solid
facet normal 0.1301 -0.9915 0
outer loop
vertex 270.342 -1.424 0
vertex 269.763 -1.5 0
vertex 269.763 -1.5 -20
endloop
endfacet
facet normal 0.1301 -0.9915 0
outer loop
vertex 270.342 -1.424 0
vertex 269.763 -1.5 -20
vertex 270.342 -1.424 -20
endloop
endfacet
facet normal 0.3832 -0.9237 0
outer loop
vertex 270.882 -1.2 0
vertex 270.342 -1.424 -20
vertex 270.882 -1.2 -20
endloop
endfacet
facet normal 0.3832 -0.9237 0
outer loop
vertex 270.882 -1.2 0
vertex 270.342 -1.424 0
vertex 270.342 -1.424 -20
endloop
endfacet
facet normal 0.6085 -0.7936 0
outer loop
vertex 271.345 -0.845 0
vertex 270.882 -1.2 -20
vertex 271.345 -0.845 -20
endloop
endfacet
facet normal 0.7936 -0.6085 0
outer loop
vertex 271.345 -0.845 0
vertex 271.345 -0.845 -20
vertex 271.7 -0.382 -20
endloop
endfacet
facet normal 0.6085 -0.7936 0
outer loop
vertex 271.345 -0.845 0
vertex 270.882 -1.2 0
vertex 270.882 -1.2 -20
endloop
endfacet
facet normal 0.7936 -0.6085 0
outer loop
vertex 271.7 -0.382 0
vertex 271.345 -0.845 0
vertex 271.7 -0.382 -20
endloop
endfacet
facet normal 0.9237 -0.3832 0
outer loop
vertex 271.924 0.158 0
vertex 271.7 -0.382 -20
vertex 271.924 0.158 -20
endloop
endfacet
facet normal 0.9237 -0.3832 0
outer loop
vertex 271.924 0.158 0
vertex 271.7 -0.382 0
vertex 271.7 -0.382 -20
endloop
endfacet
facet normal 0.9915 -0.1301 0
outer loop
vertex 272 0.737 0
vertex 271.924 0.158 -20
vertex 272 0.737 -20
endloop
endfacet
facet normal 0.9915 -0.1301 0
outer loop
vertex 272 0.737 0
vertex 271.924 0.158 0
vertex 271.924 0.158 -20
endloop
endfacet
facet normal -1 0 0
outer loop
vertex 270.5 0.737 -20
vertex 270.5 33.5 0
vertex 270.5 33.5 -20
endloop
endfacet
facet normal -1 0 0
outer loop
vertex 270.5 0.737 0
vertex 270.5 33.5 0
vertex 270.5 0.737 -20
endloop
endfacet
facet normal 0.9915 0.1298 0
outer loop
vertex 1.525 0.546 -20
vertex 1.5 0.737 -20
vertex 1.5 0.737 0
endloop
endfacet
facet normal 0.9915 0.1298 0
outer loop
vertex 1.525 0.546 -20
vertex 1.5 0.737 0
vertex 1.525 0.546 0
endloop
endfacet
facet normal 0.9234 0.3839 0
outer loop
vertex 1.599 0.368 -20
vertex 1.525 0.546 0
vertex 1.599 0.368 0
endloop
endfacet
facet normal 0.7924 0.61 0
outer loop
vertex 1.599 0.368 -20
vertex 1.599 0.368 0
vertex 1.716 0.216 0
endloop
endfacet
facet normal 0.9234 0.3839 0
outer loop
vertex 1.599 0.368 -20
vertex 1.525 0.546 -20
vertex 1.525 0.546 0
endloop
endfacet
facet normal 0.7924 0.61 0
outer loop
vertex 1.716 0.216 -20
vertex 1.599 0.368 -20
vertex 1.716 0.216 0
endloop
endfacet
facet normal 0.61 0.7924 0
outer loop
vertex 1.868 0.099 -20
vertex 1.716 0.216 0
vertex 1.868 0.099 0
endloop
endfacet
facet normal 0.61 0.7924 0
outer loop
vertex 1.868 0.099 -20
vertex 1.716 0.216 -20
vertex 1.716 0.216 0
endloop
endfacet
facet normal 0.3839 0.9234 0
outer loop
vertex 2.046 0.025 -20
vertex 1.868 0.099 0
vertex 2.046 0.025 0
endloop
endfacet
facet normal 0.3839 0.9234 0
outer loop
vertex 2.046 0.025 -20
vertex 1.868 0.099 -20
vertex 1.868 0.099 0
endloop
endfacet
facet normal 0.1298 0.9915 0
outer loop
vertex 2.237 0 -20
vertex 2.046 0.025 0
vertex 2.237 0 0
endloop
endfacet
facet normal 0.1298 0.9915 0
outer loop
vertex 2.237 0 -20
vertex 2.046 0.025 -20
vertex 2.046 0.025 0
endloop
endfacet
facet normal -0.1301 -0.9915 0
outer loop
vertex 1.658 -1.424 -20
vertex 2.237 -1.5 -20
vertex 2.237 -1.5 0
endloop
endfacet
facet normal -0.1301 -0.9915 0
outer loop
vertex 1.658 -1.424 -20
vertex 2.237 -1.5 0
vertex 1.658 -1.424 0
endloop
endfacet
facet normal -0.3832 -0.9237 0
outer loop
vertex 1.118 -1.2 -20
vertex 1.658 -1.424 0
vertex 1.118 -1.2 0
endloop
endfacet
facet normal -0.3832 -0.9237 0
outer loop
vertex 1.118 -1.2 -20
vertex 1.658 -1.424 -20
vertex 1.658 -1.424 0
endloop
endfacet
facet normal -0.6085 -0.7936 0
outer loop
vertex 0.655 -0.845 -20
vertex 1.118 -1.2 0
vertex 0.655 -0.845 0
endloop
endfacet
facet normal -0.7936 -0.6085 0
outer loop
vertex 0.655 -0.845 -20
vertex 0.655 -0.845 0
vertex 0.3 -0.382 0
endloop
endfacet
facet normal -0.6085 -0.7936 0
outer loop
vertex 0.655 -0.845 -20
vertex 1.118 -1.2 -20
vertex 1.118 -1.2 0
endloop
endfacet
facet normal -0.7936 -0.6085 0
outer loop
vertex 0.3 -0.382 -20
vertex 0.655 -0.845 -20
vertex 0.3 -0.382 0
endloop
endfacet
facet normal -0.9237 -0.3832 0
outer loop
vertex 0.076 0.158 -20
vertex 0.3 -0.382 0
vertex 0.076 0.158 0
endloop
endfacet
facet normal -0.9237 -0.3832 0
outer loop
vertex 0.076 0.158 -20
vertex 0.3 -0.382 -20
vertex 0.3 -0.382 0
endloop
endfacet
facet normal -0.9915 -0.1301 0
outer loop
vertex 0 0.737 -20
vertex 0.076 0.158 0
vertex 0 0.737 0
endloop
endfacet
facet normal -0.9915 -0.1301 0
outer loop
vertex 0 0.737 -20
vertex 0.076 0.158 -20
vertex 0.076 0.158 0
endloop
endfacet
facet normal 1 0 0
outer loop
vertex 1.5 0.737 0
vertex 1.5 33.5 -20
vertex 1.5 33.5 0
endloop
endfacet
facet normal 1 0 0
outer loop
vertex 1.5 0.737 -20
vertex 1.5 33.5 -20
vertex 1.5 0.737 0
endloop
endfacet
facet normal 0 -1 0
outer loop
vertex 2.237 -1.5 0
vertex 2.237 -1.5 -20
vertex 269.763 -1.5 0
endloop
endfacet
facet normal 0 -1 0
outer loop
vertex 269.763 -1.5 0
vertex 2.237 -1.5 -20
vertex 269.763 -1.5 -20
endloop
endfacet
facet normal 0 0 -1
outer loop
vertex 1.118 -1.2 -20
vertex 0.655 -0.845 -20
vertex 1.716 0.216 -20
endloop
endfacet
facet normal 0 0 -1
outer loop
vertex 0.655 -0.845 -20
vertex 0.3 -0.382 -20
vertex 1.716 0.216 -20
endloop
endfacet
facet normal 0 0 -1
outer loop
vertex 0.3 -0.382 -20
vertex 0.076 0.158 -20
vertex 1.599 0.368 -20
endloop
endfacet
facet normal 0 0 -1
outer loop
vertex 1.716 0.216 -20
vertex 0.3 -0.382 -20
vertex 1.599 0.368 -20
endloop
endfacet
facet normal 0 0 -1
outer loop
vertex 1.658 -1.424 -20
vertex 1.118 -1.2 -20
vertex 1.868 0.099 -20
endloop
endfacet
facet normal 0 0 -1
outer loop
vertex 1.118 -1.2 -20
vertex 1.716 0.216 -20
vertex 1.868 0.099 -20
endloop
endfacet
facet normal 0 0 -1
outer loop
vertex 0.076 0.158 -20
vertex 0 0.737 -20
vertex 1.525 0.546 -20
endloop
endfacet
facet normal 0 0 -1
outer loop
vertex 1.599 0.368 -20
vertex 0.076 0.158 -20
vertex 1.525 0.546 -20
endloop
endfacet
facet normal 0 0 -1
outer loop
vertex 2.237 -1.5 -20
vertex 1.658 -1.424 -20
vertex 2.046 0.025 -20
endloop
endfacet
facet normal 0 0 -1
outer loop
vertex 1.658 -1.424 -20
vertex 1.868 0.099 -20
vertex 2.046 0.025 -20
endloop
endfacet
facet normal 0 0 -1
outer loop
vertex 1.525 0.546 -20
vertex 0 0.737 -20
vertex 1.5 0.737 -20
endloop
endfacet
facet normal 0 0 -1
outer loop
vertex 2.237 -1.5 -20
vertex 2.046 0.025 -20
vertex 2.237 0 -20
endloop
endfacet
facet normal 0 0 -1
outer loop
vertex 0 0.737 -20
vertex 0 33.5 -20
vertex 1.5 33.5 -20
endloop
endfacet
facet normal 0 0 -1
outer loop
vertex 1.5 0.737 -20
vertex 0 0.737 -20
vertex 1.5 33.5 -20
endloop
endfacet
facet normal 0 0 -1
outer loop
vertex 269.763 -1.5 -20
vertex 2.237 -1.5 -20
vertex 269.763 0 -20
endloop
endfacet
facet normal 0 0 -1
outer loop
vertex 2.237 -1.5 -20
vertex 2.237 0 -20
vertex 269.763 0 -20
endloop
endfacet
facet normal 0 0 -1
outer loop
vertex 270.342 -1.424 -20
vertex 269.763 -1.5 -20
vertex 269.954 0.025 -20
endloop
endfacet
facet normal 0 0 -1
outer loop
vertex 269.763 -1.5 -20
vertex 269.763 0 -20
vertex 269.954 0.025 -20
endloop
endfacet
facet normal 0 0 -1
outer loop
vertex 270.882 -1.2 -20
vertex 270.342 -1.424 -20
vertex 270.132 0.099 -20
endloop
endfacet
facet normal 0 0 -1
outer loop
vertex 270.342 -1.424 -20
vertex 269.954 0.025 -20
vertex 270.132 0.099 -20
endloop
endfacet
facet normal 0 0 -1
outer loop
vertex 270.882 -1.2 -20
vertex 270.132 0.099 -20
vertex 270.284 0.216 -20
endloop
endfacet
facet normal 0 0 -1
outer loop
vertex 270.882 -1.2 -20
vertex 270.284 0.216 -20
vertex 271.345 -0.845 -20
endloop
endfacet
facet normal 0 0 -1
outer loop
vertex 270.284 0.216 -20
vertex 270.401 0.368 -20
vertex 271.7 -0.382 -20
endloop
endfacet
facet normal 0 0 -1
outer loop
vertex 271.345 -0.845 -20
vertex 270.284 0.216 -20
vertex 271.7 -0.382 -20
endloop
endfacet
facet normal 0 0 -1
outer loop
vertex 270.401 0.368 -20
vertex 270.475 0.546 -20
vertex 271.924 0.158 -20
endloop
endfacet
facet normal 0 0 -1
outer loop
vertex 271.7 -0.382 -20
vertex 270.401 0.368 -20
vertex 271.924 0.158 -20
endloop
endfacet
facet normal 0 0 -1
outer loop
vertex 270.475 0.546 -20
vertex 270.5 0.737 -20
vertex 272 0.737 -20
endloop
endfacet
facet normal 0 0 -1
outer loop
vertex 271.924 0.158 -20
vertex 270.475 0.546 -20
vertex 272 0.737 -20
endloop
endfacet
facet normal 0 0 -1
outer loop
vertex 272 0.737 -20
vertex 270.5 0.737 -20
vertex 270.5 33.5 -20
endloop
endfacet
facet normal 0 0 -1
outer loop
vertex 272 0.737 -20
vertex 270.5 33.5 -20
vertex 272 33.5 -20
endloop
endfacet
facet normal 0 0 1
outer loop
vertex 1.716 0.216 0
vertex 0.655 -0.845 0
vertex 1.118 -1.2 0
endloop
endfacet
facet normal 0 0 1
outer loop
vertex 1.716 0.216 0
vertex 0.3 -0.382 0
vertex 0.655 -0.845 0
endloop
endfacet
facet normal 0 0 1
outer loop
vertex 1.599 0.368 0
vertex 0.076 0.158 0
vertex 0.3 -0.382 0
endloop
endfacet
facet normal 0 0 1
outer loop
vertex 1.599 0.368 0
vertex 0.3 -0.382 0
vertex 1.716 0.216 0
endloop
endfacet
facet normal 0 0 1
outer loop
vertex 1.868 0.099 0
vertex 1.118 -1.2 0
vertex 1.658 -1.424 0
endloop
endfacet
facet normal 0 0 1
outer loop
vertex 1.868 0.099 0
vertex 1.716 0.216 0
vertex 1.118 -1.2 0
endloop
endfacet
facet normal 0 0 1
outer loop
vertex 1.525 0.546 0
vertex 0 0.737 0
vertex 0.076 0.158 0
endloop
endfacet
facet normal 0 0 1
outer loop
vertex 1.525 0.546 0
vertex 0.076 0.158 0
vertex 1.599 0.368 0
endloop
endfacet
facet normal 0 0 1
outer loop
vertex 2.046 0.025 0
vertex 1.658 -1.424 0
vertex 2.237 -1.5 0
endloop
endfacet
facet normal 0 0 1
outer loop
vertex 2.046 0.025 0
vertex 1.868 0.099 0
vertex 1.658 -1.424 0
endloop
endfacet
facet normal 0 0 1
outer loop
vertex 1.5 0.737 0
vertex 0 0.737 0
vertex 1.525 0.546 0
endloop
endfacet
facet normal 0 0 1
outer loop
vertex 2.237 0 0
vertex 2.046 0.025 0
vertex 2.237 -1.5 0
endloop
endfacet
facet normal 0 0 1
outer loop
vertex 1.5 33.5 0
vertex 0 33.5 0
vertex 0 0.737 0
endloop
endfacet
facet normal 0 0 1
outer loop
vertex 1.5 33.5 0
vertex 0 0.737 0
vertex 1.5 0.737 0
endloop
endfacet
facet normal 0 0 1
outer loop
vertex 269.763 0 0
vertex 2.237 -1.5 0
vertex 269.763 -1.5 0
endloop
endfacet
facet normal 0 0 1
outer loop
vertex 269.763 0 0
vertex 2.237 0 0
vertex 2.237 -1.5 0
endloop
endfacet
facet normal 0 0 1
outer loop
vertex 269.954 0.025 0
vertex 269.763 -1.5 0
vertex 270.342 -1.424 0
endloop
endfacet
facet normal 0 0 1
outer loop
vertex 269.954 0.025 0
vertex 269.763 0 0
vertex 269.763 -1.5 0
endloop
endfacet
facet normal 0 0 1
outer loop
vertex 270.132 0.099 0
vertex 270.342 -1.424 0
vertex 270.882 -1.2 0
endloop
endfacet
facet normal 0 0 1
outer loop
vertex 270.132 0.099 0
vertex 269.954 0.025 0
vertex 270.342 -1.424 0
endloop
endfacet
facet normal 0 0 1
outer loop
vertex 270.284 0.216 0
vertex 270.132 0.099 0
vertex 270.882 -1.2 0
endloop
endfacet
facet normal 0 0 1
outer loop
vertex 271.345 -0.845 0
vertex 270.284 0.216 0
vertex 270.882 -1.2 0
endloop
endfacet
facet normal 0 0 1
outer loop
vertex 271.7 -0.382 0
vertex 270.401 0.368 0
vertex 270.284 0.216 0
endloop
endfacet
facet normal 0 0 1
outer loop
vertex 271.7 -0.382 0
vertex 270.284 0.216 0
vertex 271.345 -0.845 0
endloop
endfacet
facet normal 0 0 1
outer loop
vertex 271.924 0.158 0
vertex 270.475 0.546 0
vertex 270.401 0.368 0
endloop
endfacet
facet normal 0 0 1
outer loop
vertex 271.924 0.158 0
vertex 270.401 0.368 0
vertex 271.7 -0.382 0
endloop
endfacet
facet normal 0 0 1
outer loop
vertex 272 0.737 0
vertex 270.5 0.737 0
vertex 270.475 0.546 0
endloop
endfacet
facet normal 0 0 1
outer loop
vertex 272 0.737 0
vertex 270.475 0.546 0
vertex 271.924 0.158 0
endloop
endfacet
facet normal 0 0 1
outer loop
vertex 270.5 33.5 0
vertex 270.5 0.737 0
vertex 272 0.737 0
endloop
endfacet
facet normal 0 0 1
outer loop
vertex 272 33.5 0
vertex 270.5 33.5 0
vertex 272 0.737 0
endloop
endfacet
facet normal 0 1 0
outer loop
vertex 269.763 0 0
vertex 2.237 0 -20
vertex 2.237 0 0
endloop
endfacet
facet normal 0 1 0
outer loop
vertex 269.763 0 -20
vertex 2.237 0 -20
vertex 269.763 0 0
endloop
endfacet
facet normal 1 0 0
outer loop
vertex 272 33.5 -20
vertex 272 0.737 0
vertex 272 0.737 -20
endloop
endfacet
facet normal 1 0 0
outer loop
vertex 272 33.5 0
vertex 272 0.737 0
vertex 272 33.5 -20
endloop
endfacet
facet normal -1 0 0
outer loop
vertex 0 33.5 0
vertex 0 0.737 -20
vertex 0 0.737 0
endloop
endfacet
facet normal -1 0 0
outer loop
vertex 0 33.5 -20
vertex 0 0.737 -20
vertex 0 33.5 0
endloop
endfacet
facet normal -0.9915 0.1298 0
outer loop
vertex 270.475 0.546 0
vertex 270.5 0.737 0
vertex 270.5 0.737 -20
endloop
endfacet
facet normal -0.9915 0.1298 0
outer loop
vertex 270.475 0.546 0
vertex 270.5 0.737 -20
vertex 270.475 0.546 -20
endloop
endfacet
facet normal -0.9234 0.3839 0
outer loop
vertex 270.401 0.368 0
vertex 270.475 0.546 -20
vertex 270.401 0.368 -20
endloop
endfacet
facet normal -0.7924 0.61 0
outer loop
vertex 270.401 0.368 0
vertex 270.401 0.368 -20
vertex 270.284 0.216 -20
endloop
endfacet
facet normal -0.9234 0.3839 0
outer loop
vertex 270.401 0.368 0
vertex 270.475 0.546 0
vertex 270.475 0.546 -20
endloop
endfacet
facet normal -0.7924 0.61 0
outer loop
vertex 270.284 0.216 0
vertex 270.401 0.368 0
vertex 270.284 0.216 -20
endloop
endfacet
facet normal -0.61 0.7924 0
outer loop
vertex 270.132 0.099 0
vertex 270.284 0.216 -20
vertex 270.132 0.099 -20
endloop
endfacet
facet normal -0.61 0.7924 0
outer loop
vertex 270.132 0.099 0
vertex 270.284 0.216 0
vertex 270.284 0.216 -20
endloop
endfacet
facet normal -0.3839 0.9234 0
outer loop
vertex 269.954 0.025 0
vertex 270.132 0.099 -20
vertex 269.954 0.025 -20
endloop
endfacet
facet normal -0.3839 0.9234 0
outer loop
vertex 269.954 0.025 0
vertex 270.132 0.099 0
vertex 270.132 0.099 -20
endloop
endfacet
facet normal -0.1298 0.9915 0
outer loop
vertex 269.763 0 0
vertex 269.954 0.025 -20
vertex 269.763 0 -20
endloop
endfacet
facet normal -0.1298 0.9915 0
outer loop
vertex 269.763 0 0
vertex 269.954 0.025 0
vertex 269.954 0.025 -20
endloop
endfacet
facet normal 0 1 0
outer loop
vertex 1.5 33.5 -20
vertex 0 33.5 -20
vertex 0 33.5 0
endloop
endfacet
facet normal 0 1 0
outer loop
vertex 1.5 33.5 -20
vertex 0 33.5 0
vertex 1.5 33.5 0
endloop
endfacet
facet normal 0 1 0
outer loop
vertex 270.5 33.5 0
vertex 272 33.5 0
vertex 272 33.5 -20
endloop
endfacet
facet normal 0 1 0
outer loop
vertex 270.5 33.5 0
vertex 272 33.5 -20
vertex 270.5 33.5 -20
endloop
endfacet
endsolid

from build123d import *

# Parameters (mm, degrees)
SKETCH_1_W                       = 272
SKETCH_1_H                       = 20
SM_BASE_FLANGE_1_DEPTH           = 1.5
SM_EDGE_FLANGE_1_STRIP_W         = 7.4732
SM_EDGE_FLANGE_1_STRIP_H         = 1.5
SM_EDGE_FLANGE_1_STRIP_CUT_DEPTH = 20
SM_EDGE_FLANGE_1_DEPTH           = 20
SM_EDGE_FLANGE_2_STRIP_W         = 7.4732
SM_EDGE_FLANGE_2_STRIP_H         = 1.5
SM_EDGE_FLANGE_2_STRIP_CUT_DEPTH = 20
SM_EDGE_FLANGE_2_DEPTH           = 20


# Sheet-metal steps are written as plain solids
with BuildPart() as part:
    # Sketch 1 → Базовая кромка1 (new body)
    with BuildSketch(Plane(origin=(0, 0, 0), x_dir=(1, 0, 0), z_dir=(0, 1, 0))):
        with Locations((136, 10)):
            Rectangle(SKETCH_1_W, SKETCH_1_H)
    extrude(amount=-SM_BASE_FLANGE_1_DEPTH)

    # Ребро-кромка1 strip (across the edge) → Ребро-кромка1 strip cut (cut)
    with BuildSketch(Plane.XY.offset(-20)):
        with Locations((-1.5, -0.75)):
            Rectangle(SM_EDGE_FLANGE_1_STRIP_W, SM_EDGE_FLANGE_1_STRIP_H)
    extrude(amount=SM_EDGE_FLANGE_1_STRIP_CUT_DEPTH, mode=Mode.SUBTRACT)

    # Ребро-кромка1 section (across the edge) → Ребро-кромка1 (add)
    with BuildSketch(Plane.XY.offset(-20)):
        with BuildLine():
            Line((0, 0.7366), (0, 33.5))
            Line((0, 33.5), (1.5, 33.5))
            Line((1.5, 33.5), (1.5, 0.7366))
            ThreePointArc((1.5, 0.7366), (1.715745145, 0.215745145), (2.2366, 0))
            Line((2.2366, 0), (2.2366, -1.5))
            ThreePointArc((2.2366, -1.5), (0.655084973, -0.844915027), (0, 0.7366))
        make_face()
    extrude(amount=SM_EDGE_FLANGE_1_DEPTH)

    # Ребро-кромка2 strip (across the edge) → Ребро-кромка2 strip cut (cut)
    with BuildSketch(Plane(origin=(272, 0, 0), x_dir=(-1, 0, 0), z_dir=(0, 0, -1))):
        with Locations((-1.5, -0.75)):
            Rectangle(SM_EDGE_FLANGE_2_STRIP_W, SM_EDGE_FLANGE_2_STRIP_H)
    extrude(amount=SM_EDGE_FLANGE_2_STRIP_CUT_DEPTH, mode=Mode.SUBTRACT)

    # Ребро-кромка2 section (across the edge) → Ребро-кромка2 (add)
    with BuildSketch(Plane(origin=(272, 0, 0), x_dir=(-1, 0, 0), z_dir=(0, 0, -1))):
        with BuildLine():
            Line((0, 0.7366), (0, 33.5))
            Line((0, 33.5), (1.5, 33.5))
            Line((1.5, 33.5), (1.5, 0.7366))
            ThreePointArc((1.5, 0.7366), (1.715745145, 0.215745145), (2.2366, 0))
            Line((2.2366, 0), (2.2366, -1.5))
            ThreePointArc((2.2366, -1.5), (0.655084973, -0.844915027), (0, 0.7366))
        make_face()
    extrude(amount=SM_EDGE_FLANGE_2_DEPTH)


solid = part.part
